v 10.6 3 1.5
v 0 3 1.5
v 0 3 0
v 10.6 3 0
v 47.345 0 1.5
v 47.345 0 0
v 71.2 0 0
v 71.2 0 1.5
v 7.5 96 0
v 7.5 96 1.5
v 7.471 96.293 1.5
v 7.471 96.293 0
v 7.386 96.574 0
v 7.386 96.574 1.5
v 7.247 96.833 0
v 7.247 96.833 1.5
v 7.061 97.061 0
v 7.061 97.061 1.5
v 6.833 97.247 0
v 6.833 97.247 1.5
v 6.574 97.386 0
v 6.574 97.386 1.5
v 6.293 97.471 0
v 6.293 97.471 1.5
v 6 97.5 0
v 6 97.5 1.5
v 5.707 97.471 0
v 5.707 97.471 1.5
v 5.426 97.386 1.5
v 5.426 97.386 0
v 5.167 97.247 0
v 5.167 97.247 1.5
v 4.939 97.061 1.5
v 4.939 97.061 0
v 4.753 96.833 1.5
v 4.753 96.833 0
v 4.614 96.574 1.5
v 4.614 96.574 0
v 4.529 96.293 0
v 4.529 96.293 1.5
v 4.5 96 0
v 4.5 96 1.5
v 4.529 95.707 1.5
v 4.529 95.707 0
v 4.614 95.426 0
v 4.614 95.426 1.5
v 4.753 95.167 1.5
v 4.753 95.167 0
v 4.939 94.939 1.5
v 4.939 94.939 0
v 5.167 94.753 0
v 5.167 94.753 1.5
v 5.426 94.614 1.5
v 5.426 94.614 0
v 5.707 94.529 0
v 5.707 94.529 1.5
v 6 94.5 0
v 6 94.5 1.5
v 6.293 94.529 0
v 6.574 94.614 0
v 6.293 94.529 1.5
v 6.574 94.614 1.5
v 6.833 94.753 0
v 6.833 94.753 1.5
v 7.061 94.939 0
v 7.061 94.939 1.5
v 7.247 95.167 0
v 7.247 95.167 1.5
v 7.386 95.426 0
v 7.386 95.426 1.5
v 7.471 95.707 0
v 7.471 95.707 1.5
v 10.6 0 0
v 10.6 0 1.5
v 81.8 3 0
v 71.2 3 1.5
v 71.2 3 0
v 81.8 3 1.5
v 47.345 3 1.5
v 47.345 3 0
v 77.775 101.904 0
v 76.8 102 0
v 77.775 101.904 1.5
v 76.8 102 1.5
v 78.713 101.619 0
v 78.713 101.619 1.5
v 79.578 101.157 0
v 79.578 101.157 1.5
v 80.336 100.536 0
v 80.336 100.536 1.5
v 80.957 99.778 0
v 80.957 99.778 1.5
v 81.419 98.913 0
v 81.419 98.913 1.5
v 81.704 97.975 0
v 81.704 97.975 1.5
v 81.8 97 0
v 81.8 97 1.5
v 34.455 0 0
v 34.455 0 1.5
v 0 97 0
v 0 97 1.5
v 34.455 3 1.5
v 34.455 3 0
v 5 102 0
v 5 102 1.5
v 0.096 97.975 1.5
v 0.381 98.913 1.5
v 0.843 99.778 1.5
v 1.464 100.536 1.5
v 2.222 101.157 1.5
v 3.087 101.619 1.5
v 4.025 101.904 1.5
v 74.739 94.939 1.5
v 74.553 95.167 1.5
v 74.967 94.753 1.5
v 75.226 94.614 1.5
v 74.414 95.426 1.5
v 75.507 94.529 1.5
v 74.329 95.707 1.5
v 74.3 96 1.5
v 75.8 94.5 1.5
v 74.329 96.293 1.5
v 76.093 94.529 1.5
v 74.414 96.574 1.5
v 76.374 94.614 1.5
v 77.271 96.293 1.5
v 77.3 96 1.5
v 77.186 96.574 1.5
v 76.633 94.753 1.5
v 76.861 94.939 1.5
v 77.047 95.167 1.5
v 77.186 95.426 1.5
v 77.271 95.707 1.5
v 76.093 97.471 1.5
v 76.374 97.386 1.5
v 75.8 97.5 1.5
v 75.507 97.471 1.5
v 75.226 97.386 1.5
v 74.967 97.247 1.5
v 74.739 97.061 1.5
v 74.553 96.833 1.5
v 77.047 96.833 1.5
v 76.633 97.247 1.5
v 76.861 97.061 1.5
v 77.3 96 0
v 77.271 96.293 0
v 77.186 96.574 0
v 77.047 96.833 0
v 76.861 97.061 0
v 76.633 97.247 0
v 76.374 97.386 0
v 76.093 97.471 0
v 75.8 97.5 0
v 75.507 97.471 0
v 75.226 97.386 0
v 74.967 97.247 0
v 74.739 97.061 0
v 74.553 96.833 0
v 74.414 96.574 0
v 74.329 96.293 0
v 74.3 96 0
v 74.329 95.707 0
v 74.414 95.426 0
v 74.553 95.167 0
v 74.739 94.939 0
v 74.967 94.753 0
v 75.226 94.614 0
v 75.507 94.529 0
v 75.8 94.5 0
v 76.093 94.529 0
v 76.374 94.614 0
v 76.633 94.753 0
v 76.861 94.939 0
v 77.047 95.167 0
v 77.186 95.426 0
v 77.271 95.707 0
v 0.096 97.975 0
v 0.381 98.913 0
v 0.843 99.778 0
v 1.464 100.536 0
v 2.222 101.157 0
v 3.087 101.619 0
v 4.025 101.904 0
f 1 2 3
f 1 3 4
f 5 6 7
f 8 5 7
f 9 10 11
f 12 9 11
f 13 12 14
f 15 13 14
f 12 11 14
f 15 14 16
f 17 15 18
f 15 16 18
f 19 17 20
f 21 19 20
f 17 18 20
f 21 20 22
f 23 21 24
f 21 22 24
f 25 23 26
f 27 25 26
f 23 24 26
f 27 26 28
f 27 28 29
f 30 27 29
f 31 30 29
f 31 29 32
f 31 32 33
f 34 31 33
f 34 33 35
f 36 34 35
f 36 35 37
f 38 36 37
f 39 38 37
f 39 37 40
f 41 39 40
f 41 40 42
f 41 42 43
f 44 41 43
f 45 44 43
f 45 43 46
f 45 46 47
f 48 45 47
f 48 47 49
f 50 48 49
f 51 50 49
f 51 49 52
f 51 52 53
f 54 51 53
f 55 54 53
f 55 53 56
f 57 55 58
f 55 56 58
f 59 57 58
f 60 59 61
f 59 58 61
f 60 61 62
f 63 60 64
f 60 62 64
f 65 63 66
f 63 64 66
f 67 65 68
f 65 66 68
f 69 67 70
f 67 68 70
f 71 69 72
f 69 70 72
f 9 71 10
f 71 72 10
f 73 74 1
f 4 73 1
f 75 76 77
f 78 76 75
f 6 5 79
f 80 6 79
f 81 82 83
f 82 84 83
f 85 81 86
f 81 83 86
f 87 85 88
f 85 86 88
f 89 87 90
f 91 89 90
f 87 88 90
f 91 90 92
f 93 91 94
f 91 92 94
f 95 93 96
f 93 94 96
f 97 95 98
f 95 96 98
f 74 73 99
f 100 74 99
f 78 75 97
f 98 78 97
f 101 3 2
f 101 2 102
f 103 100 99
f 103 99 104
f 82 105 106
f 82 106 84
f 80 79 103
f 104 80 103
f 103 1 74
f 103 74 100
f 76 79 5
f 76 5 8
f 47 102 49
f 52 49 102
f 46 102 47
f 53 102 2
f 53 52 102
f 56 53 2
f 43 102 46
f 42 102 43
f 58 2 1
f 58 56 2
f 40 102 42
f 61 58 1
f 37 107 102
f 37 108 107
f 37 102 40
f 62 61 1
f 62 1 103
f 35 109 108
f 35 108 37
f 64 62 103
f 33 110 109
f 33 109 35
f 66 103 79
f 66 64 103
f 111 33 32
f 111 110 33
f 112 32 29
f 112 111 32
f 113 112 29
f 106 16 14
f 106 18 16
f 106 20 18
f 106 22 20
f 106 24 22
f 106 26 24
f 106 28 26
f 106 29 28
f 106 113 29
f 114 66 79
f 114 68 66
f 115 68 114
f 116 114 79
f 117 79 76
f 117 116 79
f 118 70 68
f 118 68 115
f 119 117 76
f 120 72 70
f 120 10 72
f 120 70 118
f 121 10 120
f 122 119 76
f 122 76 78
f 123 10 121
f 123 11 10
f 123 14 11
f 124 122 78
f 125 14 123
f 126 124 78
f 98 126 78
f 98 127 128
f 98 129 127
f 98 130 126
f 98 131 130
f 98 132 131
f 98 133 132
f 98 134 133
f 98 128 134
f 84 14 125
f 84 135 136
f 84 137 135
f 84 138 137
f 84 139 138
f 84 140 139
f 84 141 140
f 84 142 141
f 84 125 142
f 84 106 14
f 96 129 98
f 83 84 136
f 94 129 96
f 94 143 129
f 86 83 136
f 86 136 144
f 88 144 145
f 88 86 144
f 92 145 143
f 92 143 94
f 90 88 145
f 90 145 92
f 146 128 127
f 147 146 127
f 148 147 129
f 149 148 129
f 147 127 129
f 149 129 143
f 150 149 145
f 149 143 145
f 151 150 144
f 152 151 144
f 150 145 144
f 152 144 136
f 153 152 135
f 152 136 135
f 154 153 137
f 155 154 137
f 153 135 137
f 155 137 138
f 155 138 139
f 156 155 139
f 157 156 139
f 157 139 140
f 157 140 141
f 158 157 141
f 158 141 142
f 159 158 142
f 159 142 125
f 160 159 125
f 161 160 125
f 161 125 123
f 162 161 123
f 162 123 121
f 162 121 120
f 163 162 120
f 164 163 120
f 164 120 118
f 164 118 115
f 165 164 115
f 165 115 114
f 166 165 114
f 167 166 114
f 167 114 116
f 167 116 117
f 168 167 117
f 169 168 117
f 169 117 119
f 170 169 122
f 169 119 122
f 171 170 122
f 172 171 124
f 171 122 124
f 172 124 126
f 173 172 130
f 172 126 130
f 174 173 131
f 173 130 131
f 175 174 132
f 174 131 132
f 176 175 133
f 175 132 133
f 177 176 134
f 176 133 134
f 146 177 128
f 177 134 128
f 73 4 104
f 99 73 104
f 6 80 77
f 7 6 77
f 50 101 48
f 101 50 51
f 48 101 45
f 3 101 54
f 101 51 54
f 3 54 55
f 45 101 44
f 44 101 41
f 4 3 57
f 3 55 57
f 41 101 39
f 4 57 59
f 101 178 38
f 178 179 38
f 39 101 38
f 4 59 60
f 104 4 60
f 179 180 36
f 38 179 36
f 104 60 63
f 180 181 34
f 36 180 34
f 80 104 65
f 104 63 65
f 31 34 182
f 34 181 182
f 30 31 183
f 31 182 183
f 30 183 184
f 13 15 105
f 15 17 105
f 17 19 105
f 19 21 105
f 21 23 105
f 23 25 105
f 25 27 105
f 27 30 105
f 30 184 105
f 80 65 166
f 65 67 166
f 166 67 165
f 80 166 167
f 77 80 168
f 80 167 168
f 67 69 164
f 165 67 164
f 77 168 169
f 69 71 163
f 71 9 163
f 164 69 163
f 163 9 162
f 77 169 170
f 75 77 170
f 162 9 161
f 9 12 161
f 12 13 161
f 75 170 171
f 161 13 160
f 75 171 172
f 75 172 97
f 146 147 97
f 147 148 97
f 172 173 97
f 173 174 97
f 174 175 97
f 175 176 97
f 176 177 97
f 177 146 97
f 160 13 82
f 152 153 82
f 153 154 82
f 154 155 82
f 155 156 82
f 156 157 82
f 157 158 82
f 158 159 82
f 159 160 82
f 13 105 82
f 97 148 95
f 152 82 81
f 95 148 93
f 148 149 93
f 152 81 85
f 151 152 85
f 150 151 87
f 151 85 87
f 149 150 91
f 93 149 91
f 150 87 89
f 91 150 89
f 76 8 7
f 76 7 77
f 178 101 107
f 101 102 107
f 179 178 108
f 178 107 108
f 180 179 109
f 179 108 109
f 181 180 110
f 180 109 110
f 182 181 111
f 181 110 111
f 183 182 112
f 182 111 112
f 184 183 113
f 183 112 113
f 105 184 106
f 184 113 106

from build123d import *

# Parameters (mm, degrees)
SKETCH1_W           = 81.8
SKETCH1_H           = 102
BOSS_EXTRUDE1_DEPTH = 1.5
SKETCH2_W           = 10.6
SKETCH2_H           = 3
SKETCH2_W_2         = 6.445
SKETCH2_R           = 1.5
CUT_EXTRUDE1_DEPTH  = 2.5
FILLET1_R           = 5


with BuildPart() as part:
    # Sketch1 → Boss-Extrude1 (new body)
    with BuildSketch(Plane.XY):
        with Locations((40.9, 51)):
            Rectangle(SKETCH1_W, SKETCH1_H)
    extrude(amount=BOSS_EXTRUDE1_DEPTH)

    # Sketch2 → Cut-Extrude1 (cut, through all)
    with BuildSketch(Plane.XY.offset(1.5)):
        with Locations((5.3, 1.5)):
            Rectangle(SKETCH2_W, SKETCH2_H)
        with Locations((44.1225, 1.5)):
            Rectangle(SKETCH2_W_2, SKETCH2_H)
        with Locations((37.6775, 1.5)):
            Rectangle(SKETCH2_W_2, SKETCH2_H)
        with Locations((76.5, 1.5)):
            Rectangle(SKETCH2_W, SKETCH2_H)
        with Locations((6, 96)):
            Circle(SKETCH2_R)
        with Locations((75.8, 96)):
            Circle(SKETCH2_R)
    extrude(amount=-CUT_EXTRUDE1_DEPTH, mode=Mode.SUBTRACT)

    # Fillet1
    fillet1_edges = [part.edges().sort_by_distance(p)[0] for p in [
        (0, 102, 0.75),
        (81.8, 102, 0.75),
    ]]
    fillet(fillet1_edges, radius=FILLET1_R)


solid = part.part
